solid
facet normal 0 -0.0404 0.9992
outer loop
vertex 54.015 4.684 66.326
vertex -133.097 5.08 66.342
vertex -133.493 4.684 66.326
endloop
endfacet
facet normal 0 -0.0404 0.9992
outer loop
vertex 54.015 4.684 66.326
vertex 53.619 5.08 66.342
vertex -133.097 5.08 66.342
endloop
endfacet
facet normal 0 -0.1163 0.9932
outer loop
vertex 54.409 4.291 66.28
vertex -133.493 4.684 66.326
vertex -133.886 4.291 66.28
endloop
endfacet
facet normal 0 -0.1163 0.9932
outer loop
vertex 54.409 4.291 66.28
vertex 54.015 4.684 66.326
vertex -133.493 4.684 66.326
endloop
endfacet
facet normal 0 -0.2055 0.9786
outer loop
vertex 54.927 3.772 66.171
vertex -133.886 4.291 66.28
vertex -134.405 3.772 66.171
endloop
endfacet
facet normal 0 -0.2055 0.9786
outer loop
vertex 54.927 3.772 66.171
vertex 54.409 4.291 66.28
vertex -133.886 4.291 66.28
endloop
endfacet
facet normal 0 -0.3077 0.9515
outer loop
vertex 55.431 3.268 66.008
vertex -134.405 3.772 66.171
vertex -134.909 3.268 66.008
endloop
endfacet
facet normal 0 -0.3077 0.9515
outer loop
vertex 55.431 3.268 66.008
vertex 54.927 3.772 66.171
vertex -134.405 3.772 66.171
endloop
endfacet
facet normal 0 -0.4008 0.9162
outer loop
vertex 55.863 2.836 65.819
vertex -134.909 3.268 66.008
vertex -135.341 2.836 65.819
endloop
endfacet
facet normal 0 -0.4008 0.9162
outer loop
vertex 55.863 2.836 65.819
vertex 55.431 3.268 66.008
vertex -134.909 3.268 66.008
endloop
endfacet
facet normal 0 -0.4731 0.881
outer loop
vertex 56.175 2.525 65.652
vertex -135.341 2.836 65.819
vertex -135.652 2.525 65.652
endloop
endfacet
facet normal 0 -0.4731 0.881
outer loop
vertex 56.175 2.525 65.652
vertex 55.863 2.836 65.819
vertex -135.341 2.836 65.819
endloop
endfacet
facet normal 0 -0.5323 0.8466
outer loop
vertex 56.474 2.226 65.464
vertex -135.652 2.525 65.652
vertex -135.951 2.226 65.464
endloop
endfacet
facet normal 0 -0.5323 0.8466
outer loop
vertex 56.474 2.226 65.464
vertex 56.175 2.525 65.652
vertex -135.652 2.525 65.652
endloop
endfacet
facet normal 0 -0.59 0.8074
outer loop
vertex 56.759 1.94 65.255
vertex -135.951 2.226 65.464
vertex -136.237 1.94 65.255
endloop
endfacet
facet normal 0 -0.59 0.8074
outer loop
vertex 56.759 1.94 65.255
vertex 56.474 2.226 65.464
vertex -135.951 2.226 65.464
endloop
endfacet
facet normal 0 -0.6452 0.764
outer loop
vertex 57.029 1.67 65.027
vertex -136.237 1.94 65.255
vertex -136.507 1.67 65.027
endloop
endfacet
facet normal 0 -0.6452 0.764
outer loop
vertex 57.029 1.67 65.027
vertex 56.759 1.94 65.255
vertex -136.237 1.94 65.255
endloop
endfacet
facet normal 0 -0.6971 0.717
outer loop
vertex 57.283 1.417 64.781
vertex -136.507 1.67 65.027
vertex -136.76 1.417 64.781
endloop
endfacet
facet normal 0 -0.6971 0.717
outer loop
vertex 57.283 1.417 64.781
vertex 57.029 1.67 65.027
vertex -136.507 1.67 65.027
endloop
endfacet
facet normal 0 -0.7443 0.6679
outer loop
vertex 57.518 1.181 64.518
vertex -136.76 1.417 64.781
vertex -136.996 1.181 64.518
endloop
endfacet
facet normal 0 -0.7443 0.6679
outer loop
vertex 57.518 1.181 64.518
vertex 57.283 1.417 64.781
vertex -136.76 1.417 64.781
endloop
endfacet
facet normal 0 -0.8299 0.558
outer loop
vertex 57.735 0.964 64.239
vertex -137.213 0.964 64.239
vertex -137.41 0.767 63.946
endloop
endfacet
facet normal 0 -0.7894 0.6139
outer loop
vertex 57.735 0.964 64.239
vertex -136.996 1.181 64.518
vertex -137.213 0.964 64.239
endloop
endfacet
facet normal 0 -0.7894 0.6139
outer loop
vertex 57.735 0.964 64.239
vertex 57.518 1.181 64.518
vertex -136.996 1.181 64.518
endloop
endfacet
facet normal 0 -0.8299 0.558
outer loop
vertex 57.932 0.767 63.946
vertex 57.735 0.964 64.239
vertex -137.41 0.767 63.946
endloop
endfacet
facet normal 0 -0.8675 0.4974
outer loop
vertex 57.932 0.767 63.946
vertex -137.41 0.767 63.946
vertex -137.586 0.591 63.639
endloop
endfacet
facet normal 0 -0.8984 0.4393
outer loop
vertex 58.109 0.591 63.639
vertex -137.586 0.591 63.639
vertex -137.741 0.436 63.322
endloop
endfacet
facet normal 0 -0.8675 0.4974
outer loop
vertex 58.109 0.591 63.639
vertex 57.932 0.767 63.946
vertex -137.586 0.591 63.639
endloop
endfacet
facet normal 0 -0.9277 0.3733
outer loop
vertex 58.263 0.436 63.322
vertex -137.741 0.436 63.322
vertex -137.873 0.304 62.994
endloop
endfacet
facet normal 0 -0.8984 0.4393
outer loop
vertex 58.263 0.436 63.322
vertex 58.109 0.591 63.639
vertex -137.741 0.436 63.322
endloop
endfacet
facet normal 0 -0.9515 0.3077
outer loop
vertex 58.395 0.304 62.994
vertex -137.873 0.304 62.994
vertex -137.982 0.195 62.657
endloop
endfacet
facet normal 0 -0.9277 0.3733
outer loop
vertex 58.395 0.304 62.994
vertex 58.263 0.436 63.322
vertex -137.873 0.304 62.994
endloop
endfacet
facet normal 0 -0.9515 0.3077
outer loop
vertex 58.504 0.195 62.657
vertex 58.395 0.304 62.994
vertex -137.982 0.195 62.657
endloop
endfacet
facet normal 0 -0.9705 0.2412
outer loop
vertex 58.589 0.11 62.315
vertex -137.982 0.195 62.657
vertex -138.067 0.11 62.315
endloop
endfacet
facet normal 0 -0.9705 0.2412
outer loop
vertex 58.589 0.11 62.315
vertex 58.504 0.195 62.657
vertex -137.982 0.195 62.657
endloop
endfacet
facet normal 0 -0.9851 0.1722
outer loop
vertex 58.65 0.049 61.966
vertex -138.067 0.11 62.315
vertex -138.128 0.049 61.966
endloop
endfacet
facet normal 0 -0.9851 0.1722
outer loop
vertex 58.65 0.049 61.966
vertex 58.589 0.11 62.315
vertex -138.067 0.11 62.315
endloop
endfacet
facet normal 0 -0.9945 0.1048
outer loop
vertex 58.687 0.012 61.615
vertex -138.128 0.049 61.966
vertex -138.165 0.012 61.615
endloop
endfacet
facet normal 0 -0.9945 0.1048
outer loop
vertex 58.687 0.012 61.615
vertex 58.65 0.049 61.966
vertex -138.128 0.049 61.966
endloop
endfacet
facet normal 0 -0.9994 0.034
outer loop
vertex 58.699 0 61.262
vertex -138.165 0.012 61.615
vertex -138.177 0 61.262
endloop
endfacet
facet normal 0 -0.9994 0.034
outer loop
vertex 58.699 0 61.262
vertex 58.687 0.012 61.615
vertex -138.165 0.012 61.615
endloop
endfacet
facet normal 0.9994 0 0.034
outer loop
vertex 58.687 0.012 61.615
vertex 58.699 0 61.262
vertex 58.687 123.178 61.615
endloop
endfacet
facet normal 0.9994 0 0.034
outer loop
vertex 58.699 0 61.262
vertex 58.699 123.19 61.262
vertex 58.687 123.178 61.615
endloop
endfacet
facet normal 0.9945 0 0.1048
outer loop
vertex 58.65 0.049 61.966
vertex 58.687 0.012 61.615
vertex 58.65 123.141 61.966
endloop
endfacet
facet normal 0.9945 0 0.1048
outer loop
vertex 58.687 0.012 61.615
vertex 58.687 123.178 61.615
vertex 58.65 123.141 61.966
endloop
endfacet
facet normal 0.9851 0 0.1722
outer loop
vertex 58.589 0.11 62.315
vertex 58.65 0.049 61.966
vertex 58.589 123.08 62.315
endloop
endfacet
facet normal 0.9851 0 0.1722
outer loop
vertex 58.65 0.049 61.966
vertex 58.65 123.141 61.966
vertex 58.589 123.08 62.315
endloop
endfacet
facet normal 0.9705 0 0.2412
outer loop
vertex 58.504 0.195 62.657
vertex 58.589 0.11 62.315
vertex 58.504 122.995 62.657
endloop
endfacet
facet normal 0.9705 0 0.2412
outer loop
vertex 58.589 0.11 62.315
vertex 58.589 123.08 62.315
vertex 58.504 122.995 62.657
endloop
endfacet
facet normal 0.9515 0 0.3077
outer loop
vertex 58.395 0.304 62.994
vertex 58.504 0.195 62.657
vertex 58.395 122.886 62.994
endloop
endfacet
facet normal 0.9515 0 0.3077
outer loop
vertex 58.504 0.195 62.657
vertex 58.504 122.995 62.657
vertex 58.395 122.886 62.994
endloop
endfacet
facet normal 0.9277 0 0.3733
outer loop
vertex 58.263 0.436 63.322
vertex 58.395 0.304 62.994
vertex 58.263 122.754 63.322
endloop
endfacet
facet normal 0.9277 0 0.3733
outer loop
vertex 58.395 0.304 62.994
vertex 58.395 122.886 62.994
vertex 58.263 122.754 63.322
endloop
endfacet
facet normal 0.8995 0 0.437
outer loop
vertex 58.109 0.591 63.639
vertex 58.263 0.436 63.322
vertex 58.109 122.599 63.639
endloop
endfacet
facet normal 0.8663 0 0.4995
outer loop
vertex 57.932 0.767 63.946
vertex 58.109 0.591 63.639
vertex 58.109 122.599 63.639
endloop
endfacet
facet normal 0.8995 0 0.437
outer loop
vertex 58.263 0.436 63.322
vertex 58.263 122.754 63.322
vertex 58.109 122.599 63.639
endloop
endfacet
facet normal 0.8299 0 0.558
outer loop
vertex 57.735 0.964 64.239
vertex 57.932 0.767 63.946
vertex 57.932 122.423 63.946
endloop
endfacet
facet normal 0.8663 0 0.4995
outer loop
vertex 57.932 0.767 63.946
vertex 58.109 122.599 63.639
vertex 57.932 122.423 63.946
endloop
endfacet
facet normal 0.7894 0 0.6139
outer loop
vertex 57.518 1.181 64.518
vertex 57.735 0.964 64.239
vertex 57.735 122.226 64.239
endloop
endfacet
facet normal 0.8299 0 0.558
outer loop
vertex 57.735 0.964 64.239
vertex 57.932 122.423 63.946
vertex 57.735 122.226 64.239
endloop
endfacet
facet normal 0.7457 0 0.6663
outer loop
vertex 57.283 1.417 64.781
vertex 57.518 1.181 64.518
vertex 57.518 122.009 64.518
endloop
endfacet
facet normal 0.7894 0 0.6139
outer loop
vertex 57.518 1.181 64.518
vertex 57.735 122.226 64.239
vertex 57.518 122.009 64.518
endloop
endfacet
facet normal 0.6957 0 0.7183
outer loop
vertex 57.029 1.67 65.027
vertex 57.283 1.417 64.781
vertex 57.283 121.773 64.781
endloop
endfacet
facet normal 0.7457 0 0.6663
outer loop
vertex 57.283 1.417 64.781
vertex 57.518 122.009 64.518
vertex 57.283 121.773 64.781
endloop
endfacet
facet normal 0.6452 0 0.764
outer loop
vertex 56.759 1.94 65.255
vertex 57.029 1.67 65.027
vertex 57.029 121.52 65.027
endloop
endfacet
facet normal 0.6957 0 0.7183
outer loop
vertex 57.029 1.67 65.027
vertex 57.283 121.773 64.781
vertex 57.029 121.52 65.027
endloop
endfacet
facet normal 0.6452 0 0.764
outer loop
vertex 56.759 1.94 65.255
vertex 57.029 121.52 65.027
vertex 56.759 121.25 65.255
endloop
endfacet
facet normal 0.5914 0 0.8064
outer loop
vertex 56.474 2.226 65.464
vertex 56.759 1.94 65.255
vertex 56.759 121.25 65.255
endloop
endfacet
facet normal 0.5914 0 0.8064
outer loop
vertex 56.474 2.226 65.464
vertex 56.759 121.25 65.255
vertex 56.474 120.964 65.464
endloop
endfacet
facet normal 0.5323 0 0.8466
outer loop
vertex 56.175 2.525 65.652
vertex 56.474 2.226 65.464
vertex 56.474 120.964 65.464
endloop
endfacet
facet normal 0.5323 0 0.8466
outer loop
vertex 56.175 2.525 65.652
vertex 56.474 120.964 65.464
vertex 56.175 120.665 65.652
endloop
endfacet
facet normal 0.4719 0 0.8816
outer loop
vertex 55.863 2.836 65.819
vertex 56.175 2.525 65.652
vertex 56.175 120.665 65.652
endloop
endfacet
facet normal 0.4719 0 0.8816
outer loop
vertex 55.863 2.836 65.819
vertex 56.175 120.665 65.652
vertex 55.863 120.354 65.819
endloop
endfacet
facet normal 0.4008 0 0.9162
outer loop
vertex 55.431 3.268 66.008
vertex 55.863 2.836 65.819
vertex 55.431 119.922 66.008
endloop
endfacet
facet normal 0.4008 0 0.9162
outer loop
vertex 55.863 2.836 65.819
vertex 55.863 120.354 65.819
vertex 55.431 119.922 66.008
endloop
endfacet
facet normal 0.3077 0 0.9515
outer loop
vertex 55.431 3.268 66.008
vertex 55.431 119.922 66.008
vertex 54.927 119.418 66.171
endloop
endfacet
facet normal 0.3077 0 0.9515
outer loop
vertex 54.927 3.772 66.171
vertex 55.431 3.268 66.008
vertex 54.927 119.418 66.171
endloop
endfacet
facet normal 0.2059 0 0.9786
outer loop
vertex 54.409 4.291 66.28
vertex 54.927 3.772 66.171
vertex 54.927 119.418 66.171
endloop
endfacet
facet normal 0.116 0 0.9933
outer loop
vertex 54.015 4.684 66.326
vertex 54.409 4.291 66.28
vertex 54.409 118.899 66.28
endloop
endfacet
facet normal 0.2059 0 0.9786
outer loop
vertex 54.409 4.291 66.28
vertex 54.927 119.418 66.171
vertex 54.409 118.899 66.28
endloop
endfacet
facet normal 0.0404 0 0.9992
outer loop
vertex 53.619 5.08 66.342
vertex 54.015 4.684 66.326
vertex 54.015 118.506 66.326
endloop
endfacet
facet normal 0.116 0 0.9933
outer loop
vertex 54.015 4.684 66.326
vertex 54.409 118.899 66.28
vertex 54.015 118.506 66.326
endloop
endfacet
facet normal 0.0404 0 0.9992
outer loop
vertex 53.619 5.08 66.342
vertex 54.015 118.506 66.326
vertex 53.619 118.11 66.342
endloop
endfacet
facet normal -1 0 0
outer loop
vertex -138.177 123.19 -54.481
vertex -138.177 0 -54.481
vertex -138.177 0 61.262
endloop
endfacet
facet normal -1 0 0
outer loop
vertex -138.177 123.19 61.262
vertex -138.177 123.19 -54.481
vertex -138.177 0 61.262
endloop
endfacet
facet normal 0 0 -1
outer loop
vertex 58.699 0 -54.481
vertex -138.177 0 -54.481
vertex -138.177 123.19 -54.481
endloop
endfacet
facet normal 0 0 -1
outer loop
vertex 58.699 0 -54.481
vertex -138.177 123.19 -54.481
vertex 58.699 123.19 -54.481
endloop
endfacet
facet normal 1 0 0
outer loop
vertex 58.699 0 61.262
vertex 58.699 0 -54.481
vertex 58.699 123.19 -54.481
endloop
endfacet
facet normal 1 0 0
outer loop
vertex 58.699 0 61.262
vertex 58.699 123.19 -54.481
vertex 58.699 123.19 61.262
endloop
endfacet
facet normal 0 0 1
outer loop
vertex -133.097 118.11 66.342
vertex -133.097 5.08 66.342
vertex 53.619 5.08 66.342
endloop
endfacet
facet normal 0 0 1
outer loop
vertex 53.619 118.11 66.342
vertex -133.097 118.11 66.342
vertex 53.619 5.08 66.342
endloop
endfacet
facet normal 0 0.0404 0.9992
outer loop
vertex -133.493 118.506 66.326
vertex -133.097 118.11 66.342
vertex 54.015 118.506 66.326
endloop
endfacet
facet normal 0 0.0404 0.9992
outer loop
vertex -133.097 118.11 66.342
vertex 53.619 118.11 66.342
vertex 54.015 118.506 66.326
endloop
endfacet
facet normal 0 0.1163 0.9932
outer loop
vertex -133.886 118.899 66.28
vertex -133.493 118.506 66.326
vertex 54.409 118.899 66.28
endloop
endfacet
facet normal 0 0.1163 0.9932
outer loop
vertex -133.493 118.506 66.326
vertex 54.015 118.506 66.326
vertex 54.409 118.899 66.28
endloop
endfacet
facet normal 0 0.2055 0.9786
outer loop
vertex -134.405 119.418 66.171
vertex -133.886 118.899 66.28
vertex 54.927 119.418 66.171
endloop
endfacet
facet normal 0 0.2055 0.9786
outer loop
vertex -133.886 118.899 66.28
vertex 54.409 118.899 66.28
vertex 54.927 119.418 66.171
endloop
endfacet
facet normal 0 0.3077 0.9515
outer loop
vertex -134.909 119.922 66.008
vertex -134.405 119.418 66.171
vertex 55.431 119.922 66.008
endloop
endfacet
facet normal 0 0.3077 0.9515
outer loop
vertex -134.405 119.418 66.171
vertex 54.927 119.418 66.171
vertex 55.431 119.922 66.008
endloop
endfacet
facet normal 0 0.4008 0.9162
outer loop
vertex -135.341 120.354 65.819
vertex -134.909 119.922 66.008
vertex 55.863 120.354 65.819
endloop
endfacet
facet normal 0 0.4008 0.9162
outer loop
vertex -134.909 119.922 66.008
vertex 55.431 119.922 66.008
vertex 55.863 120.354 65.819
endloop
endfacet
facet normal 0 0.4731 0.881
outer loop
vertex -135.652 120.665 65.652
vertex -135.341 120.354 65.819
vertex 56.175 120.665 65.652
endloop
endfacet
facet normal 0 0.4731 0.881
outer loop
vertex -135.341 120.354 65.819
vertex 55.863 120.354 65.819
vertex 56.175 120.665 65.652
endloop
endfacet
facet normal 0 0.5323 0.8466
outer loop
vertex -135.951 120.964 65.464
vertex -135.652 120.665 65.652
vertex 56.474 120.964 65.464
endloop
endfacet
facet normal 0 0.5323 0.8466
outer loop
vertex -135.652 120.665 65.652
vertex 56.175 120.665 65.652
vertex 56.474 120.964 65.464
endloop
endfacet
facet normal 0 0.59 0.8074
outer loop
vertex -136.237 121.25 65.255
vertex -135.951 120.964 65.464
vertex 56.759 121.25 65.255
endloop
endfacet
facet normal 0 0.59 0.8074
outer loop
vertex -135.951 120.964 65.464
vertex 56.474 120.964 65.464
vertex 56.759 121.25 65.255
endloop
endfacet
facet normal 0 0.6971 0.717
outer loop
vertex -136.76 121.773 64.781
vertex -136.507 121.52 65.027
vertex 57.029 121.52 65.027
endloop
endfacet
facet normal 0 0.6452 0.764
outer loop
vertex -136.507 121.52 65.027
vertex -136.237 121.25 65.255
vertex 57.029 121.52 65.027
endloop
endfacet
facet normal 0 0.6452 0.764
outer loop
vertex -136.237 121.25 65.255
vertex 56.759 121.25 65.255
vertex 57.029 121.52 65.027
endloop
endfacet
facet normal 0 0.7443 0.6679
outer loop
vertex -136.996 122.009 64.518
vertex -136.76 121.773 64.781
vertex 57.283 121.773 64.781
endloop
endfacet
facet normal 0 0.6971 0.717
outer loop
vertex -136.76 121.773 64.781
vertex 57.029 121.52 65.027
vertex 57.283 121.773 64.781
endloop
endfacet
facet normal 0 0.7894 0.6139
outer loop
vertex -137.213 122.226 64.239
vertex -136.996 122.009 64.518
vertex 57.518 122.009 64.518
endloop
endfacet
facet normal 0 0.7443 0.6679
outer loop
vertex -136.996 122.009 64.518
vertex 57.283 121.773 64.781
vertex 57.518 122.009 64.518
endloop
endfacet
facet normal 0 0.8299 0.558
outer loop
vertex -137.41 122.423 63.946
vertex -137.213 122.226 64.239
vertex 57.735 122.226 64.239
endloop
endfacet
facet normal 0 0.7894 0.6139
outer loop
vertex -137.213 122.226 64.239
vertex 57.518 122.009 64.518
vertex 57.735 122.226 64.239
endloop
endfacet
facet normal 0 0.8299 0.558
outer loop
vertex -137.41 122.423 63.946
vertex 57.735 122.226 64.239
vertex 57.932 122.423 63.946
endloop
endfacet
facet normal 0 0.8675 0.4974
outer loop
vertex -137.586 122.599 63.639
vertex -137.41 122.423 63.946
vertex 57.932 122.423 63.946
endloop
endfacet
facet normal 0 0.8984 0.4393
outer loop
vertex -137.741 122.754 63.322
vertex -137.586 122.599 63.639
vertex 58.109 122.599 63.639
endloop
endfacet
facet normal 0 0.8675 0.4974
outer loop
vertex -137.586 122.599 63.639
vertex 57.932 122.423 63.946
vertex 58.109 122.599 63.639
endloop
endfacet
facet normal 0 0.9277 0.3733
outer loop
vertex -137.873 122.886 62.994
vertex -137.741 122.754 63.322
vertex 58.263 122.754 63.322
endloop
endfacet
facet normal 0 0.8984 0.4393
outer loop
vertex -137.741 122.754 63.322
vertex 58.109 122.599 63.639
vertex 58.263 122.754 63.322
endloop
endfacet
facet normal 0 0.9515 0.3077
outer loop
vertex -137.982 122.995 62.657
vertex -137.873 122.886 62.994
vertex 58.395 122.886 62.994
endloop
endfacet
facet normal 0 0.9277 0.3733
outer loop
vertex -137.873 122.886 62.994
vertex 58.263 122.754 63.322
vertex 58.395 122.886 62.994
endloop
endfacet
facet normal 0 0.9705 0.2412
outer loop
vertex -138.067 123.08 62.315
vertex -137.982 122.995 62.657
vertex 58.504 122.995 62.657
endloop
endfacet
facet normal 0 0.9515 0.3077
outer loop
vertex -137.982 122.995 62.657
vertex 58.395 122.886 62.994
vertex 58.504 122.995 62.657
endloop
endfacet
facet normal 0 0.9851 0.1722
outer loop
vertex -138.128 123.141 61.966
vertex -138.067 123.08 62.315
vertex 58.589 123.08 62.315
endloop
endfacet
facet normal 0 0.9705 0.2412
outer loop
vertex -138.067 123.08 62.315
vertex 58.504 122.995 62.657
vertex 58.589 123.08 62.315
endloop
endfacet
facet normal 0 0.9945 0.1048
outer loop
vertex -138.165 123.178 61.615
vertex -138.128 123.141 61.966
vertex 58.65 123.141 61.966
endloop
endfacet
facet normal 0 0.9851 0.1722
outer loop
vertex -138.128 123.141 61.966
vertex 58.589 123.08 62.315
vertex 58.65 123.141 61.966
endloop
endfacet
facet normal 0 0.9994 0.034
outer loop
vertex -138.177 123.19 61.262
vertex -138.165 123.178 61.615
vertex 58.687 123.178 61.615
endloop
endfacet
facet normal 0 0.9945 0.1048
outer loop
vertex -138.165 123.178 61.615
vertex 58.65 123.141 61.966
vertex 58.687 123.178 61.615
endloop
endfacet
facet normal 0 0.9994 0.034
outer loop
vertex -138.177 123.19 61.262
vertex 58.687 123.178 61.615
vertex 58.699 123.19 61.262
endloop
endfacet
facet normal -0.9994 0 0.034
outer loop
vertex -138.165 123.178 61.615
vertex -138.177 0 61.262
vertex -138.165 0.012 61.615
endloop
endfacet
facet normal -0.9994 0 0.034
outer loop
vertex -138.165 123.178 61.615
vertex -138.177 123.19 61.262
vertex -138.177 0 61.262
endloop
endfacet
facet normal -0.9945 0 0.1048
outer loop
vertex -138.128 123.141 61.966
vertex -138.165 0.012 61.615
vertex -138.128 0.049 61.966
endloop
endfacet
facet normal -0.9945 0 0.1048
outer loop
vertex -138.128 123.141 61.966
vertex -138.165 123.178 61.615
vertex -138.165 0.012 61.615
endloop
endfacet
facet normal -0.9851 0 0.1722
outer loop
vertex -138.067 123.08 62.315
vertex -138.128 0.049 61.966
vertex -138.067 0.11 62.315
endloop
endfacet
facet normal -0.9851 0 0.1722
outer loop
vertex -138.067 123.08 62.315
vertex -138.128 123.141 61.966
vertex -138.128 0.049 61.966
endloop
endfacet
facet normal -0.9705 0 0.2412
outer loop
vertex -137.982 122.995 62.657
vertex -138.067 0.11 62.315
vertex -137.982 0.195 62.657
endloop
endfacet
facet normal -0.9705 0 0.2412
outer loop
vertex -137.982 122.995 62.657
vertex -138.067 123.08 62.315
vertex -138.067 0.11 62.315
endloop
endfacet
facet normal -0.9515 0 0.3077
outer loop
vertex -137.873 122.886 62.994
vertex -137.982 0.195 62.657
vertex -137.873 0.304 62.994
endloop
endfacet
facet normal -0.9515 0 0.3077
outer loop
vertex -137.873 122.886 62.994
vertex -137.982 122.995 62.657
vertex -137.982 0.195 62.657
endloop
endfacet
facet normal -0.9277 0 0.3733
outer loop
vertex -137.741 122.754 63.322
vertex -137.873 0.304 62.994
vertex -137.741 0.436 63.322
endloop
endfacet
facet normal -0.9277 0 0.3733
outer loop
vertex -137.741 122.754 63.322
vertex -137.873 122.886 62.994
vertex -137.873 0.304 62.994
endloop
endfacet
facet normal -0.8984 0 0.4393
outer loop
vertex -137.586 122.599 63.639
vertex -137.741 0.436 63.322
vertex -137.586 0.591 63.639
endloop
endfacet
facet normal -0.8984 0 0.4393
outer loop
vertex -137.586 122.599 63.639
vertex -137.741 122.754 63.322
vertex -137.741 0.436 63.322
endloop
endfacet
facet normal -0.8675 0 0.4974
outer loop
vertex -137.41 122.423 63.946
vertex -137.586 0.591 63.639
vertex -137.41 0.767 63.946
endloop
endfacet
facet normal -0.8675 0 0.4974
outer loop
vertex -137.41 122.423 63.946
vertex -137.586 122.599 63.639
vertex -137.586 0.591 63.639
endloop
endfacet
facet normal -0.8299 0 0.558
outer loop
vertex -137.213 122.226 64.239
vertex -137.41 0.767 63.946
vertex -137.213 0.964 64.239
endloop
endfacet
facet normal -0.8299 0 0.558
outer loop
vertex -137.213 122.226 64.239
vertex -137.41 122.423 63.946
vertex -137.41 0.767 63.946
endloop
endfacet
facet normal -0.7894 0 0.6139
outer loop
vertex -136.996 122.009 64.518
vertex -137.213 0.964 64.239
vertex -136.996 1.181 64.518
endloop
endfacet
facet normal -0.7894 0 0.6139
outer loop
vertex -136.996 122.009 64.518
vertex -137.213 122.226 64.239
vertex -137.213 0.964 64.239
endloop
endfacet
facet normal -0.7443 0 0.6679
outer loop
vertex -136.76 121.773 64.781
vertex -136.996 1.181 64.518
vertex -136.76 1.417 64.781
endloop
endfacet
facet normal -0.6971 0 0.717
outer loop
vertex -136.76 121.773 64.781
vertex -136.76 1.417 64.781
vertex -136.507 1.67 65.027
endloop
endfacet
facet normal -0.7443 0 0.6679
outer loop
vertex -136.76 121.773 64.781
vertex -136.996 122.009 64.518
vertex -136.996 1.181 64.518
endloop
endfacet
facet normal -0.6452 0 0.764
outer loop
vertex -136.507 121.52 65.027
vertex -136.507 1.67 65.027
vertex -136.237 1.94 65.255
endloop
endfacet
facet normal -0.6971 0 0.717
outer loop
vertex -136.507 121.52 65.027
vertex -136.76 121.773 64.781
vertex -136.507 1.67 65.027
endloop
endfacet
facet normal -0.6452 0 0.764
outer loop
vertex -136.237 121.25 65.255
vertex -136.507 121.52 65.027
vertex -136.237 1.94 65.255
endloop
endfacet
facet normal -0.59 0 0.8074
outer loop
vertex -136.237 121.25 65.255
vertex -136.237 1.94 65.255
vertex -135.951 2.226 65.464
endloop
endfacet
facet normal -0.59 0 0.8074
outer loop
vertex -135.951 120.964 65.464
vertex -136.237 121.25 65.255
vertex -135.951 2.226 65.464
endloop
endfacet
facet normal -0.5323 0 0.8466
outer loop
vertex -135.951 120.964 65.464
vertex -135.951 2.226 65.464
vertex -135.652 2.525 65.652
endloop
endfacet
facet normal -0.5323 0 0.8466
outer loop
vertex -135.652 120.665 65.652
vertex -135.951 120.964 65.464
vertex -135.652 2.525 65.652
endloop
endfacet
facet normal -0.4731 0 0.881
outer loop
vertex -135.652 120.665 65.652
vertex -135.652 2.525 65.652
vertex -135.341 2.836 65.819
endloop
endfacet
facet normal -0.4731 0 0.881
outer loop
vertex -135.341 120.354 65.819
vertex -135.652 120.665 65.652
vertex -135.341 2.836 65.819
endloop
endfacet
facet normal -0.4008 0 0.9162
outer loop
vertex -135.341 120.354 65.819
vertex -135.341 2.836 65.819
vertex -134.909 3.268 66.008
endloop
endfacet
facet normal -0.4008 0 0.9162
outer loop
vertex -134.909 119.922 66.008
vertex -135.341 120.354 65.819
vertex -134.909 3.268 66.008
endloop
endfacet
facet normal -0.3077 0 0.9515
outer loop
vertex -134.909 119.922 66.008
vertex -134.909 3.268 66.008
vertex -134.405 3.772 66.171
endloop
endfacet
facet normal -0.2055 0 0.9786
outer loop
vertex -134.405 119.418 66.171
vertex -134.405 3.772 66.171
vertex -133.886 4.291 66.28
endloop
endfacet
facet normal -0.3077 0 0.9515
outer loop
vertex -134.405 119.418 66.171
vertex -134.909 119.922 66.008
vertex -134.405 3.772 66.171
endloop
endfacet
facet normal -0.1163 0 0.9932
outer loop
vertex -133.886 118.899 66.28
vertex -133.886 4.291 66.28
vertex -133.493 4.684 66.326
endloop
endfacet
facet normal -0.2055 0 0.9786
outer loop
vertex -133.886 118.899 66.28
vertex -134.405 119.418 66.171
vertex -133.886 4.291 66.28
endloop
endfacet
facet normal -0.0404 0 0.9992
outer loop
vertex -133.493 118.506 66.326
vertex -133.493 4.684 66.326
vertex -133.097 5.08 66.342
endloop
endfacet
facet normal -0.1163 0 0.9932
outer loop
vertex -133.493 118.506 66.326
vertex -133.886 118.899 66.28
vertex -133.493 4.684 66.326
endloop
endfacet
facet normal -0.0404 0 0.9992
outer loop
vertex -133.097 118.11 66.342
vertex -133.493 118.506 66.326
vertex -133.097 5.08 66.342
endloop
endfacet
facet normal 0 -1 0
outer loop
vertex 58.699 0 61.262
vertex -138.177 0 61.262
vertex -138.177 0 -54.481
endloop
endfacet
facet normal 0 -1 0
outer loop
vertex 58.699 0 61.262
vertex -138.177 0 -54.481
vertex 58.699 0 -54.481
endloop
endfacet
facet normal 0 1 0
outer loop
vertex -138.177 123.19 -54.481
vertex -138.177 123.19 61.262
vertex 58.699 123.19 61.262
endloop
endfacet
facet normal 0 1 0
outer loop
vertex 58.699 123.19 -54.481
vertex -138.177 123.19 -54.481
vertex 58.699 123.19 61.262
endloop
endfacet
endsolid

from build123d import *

# Parameters (mm, degrees)
F0_W     = 196.876261
F0_H     = 120.822865
F1_DEPTH = 123.19
F2_R     = 5.08


with BuildPart() as f1:
    # F0 (on Front) → F1 (new body)
    with BuildSketch(Plane.XZ):
        with Locations((-39.738877, 5.930362)):
            Rectangle(F0_W, F0_H)
    extrude(amount=-F1_DEPTH)

    # F2
    f2_edges = [f1.edges().sort_by_distance(p)[0] for p in [
        (58.699254, 61.595, 66.341795),
        (-138.177007, 61.595, 66.341795),
        (-39.738877, 0, 66.341795),
        (-39.738877, 123.19, 66.341795),
    ]]
    fillet(f2_edges, radius=F2_R)


solid = f1.part
